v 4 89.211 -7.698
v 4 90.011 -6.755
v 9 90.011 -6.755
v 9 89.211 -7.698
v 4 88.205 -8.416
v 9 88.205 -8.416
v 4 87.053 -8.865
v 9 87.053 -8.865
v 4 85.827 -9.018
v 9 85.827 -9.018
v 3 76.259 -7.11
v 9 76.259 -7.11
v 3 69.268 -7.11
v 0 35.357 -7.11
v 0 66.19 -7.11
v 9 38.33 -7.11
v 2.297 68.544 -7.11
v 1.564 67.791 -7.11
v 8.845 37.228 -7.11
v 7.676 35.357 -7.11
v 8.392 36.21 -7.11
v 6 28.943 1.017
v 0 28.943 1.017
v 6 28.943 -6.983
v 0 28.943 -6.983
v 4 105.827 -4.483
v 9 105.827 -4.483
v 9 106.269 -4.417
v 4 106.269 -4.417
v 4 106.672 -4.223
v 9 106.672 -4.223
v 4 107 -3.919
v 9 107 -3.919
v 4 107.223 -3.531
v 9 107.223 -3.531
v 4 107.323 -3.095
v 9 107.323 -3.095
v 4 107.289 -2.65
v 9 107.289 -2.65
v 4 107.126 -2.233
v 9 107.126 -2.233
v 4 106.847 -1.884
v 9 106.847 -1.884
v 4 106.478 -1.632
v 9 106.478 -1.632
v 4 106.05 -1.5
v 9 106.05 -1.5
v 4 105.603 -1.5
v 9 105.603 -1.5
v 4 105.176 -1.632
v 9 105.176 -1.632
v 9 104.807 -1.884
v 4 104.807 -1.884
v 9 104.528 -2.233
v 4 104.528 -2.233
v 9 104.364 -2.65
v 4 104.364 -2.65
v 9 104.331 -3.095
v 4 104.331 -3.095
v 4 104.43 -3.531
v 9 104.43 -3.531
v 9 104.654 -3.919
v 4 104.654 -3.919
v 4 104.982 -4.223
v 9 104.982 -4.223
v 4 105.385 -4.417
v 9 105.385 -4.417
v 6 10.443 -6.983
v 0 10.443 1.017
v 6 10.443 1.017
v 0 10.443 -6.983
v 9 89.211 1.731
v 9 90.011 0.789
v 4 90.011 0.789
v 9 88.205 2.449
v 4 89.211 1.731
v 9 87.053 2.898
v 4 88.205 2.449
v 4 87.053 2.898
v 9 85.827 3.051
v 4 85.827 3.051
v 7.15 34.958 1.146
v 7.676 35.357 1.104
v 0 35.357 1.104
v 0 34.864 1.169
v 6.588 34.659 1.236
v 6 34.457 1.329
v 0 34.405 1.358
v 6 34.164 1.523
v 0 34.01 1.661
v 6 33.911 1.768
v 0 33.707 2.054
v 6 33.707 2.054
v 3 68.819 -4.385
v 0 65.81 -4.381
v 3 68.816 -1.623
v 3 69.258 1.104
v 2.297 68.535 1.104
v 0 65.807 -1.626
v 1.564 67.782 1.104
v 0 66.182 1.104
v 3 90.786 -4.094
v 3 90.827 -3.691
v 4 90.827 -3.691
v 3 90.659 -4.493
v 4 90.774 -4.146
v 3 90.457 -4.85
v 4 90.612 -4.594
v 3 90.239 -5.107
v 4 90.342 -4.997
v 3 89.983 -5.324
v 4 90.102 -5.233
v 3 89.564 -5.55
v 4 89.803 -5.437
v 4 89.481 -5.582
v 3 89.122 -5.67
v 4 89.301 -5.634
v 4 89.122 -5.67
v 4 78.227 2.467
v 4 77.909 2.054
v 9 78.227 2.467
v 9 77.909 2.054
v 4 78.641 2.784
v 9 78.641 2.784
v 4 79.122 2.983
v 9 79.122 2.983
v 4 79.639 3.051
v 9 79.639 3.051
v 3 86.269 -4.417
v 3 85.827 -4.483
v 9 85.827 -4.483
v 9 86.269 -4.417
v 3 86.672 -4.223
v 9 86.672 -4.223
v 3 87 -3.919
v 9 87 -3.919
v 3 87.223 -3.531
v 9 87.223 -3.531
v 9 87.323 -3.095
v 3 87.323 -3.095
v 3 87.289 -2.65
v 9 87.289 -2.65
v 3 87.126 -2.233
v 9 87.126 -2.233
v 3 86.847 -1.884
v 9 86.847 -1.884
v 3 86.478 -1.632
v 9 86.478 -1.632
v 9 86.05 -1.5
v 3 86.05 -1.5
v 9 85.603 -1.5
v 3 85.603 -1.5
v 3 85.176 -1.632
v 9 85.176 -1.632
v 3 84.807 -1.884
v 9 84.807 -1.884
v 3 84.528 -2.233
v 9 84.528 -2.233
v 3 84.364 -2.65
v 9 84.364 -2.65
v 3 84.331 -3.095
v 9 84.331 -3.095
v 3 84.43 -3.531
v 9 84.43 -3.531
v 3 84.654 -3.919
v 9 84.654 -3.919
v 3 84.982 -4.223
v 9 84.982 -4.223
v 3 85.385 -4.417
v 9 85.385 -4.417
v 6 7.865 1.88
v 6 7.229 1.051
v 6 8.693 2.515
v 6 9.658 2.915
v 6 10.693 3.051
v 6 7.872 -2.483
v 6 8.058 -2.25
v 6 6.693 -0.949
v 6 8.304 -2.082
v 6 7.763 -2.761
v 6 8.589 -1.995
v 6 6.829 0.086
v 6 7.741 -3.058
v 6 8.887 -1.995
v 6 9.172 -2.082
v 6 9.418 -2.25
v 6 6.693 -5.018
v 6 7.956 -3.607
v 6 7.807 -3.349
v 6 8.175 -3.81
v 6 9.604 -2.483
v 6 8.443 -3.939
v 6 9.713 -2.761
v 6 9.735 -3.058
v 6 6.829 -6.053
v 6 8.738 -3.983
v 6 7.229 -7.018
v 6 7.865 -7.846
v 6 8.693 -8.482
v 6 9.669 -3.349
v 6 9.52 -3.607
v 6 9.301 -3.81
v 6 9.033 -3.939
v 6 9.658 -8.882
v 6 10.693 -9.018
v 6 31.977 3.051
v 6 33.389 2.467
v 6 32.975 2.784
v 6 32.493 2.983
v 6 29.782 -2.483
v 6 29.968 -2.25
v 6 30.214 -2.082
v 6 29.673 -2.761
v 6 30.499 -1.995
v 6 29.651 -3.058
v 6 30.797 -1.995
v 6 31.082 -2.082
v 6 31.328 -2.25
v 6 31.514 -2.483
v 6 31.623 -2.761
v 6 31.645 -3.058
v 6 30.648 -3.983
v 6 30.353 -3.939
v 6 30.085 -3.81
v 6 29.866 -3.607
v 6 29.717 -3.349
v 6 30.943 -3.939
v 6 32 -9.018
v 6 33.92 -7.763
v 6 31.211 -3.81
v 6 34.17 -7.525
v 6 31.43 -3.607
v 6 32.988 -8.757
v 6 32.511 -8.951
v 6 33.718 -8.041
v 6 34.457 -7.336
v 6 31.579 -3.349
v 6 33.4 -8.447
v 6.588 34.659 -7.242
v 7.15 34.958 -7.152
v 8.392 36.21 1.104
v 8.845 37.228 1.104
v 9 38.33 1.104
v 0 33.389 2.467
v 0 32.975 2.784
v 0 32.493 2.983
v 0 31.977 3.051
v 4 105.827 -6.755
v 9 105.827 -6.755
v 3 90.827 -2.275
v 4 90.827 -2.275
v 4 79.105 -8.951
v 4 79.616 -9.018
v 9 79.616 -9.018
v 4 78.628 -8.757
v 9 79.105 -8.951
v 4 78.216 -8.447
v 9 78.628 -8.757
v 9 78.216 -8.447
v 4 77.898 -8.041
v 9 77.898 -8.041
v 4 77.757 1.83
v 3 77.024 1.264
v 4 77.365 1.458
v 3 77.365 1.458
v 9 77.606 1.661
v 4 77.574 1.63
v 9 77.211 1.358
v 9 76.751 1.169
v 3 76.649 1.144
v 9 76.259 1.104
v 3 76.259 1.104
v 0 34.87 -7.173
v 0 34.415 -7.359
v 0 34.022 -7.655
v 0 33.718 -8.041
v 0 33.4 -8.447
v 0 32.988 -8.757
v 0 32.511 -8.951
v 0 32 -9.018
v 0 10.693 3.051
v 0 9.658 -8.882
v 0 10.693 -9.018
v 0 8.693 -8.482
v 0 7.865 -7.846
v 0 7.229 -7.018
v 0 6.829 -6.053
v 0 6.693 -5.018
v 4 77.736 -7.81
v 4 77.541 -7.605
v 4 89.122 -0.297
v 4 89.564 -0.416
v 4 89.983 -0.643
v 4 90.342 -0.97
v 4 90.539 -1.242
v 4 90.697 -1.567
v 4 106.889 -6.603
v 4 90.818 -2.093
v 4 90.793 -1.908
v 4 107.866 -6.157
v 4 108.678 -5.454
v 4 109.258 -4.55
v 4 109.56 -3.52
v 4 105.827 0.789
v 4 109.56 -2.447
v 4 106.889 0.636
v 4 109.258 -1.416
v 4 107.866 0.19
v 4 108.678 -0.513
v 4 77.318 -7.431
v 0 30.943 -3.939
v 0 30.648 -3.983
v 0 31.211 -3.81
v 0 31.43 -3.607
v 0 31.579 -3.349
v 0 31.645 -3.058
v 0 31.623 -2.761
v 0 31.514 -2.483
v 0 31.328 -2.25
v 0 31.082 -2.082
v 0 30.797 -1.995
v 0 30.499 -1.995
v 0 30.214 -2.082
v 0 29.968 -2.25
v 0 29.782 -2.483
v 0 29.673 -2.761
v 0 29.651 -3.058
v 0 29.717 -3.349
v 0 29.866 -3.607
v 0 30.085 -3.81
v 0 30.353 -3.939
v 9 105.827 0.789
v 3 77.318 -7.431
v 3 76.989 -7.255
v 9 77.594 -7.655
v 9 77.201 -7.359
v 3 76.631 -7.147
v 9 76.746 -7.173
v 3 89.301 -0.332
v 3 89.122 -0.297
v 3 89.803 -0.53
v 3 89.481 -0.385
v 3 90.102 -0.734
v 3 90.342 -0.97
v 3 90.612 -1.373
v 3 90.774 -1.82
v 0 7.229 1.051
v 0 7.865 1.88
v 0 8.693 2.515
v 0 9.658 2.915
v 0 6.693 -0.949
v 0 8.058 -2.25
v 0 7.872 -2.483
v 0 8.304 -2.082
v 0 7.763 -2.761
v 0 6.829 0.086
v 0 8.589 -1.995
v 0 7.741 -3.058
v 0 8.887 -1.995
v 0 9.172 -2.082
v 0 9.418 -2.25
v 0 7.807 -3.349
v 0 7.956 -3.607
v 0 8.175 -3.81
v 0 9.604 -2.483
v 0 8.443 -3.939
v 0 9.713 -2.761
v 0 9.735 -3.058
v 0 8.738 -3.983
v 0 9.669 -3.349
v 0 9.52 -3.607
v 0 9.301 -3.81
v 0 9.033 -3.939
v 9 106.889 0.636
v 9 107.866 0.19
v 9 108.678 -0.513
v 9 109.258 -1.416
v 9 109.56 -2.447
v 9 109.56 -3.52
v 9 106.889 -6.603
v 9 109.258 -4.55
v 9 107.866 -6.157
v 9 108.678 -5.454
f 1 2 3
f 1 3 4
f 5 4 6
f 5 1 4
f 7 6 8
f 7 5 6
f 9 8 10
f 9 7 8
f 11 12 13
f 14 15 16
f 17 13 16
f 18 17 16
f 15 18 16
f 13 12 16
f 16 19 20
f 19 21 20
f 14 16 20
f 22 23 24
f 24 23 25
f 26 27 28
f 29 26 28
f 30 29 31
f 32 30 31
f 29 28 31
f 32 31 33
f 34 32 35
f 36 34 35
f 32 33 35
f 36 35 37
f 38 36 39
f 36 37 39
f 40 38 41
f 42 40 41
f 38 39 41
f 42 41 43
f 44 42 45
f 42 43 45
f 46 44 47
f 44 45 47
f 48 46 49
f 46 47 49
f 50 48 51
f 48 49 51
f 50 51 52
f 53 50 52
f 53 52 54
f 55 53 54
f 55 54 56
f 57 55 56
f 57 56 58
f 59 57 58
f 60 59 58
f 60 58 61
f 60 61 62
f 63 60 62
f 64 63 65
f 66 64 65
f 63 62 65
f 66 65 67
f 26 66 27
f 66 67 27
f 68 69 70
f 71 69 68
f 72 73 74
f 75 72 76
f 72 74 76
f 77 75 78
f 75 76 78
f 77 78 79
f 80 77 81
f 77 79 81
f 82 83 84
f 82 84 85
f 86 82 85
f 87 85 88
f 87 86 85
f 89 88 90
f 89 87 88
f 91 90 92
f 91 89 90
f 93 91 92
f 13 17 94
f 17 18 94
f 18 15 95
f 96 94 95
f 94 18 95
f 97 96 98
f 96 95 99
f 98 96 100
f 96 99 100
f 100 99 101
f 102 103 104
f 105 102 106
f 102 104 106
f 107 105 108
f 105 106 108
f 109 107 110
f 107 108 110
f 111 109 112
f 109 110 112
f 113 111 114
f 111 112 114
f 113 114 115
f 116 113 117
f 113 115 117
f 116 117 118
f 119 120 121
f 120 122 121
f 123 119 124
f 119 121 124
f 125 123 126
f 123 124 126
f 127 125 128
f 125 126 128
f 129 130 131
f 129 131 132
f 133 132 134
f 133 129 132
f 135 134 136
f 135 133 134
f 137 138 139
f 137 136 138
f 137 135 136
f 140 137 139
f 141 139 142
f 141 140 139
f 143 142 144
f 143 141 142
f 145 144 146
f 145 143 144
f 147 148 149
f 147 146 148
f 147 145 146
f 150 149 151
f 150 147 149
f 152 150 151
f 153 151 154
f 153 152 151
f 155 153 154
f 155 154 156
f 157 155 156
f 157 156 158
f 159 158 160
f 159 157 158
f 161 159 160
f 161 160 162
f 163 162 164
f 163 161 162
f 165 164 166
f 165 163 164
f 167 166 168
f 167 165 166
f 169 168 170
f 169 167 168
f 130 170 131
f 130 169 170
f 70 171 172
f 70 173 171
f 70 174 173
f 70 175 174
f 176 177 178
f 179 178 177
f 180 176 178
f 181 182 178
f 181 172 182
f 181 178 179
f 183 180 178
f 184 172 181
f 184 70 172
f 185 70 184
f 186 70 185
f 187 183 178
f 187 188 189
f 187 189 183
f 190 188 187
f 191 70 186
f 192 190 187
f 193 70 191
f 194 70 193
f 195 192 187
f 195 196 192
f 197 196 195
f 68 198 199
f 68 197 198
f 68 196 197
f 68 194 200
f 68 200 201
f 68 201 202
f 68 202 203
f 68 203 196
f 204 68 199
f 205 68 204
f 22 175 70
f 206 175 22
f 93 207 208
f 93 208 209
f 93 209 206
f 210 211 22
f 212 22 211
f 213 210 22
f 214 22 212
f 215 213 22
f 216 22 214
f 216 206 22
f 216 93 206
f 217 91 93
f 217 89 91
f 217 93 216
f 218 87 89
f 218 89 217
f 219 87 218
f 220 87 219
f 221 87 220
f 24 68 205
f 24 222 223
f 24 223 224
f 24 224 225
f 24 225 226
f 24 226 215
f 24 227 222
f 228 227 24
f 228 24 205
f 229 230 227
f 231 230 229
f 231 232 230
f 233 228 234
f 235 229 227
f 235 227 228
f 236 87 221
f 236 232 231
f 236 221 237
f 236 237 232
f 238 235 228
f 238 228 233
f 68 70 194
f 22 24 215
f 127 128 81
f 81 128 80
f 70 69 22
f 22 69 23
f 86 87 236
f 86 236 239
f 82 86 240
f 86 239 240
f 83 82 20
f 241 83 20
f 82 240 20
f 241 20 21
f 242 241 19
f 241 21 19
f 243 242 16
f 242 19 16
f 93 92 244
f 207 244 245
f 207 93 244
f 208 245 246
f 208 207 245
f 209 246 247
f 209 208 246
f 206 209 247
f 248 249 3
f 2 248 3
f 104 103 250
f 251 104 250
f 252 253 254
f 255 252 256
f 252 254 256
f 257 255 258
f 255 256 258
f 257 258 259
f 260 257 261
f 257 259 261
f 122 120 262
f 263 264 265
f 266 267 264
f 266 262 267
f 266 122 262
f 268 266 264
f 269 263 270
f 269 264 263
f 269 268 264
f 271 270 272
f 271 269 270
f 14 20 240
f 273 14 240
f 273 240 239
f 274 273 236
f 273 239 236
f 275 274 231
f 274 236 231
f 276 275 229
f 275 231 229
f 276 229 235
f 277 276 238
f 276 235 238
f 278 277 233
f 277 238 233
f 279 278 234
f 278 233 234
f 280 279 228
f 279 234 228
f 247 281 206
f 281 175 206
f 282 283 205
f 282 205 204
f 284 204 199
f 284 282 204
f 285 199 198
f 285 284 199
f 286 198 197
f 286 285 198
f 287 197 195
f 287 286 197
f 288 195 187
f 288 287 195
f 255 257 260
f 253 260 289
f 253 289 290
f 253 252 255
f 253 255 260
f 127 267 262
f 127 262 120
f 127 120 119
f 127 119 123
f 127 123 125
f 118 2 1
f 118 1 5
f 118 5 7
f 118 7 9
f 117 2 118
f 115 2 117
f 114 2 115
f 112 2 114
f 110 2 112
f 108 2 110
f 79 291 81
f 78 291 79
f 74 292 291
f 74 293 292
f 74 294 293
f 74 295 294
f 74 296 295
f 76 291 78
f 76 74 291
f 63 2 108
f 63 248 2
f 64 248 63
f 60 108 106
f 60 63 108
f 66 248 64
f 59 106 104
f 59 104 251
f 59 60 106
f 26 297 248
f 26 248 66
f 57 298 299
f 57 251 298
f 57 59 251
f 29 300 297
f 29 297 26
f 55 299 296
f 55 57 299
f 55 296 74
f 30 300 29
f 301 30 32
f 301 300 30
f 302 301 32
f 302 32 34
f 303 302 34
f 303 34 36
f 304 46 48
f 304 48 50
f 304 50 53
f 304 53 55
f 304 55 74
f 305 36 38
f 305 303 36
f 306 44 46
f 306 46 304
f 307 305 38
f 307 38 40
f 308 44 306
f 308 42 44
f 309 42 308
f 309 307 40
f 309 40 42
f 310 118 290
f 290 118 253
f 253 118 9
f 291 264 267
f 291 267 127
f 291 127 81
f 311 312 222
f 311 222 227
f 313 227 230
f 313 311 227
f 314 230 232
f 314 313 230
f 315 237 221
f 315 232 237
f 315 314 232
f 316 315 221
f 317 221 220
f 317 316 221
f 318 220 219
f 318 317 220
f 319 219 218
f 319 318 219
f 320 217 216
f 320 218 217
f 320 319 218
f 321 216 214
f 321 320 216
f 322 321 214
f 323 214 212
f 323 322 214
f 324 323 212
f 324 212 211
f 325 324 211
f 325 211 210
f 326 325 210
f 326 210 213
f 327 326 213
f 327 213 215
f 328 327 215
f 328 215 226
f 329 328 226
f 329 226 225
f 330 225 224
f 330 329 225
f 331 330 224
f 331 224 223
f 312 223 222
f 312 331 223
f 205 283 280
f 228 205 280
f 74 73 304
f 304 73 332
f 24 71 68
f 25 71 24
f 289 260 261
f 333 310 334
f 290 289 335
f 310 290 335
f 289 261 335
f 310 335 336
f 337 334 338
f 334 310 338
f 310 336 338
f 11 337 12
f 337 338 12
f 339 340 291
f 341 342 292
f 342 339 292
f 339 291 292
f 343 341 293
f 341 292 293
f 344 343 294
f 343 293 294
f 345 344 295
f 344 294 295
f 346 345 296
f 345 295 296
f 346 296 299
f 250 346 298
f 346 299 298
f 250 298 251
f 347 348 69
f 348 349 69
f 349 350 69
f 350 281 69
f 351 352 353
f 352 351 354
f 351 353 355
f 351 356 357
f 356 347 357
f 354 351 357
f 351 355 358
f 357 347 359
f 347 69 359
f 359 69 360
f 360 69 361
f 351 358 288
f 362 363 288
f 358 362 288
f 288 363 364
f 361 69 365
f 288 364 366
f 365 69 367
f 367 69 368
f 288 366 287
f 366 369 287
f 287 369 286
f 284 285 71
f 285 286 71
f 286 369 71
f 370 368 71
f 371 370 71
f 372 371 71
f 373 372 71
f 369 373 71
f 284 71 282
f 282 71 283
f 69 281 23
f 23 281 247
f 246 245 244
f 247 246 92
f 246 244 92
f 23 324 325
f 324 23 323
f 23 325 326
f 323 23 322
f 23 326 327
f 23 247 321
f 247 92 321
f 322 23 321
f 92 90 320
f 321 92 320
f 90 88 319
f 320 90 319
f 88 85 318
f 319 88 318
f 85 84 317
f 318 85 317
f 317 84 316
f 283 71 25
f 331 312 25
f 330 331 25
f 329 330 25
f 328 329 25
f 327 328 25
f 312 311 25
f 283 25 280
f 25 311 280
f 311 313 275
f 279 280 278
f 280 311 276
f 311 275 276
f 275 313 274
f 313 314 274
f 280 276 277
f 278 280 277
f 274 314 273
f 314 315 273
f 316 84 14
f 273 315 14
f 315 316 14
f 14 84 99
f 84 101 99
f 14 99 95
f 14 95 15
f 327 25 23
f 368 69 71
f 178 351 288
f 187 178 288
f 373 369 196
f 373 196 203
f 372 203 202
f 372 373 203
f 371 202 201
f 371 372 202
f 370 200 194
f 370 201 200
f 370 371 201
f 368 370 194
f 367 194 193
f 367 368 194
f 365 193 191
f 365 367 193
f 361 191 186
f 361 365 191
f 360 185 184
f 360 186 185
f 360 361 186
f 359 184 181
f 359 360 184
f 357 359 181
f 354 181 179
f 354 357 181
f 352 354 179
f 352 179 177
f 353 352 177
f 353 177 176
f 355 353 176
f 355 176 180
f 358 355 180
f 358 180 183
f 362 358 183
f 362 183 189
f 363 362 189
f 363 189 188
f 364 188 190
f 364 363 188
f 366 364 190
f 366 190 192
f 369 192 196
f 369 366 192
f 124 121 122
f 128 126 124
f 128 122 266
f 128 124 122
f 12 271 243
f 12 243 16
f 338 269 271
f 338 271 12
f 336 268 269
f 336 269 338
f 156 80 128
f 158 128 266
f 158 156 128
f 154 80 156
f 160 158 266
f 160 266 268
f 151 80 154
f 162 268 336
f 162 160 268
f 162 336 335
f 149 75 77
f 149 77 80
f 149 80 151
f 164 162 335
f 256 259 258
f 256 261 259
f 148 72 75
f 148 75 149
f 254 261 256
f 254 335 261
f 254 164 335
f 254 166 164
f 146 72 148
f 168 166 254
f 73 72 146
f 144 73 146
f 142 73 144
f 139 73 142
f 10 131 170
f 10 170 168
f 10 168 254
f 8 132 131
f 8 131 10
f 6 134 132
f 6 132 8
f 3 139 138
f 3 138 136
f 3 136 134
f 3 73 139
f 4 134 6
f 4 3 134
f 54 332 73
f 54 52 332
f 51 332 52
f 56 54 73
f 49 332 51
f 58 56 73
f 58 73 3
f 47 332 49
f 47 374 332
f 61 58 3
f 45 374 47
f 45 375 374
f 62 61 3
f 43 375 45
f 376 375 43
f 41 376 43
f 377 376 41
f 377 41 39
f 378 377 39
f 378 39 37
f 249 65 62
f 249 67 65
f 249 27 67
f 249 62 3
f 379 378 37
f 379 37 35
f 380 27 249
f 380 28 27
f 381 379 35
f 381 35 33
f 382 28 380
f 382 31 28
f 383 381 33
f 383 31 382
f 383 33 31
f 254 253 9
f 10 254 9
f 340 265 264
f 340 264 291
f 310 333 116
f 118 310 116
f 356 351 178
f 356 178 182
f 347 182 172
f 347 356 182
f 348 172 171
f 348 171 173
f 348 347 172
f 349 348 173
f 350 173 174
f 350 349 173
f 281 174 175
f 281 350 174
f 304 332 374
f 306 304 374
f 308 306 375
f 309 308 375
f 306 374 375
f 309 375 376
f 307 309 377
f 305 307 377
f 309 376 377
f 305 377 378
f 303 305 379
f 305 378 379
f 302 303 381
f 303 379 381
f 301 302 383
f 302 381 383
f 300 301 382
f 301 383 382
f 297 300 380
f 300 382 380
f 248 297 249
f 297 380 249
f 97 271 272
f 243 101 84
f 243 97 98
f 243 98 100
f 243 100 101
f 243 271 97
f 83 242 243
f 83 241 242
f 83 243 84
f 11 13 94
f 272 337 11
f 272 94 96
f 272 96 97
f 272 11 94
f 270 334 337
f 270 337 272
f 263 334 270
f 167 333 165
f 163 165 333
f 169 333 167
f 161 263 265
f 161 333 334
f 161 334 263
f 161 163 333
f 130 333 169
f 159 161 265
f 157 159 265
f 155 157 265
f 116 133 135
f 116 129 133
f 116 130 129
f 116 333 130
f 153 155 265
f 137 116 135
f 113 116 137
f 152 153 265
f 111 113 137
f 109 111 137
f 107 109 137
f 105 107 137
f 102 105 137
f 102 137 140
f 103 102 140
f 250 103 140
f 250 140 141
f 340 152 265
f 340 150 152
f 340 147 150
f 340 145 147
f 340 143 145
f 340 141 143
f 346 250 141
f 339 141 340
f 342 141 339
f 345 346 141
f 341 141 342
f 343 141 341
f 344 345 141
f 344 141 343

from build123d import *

# Parameters (mm, degrees)
SKETCH1_R               = 10
SKETCH1_R_2             = 0.8
SKETCH1_R_3             = 3.301767793
BOSS_EXTRUDE1_DEPTH     = 1.5
SKETCH2_R               = 10
BOSS_EXTRUDE2_DEPTH     = 9
CUT_EXTRUDE1_DEPTH      = 93.583714931
CUT_EXTRUDE1_DEPTH_BACK = 93.583714931
SKETCH3_R               = 1.5
FILLET1_R               = 5
SKETCH4_R               = 1.5
BOSS_EXTRUDE3_DEPTH     = 5
CUT_EXTRUDE2_DEPTH      = 4
FILLET3_R               = 2
SKETCH6_W               = 12.069016708
SKETCH6_H               = 36.150412664
BOSS_EXTRUDE4_DEPTH     = 9
CUT_EXTRUDE3_DEPTH      = 112.059195252
CUT_EXTRUDE3_DEPTH_BACK = 112.059195252
CUT_EXTRUDE4_DEPTH      = 111.336877259
CUT_EXTRUDE4_DEPTH_BACK = 111.336877259
SKETCH8_R               = 1
SKETCH8_W               = 8
SKETCH8_H               = 18.5
FILLET4_R               = 4
SKETCH9_W               = 24.382356312
SKETCH9_H               = 35.371587325
CUT_EXTRUDE5_DEPTH      = 3
FILLET5_R               = 4
SKETCH10_R              = 20.065343601
CUT_EXTRUDE6_DEPTH      = 3
CUT_EXTRUDE7_DEPTH      = 111.33687725
CUT_EXTRUDE7_DEPTH_BACK = 111.33687725
FILLET6_R               = 2
CHAMFER1_SIZE           = 3


# Some blends are built 0.0001 mm under size
with BuildPart() as part:
    # Sketch1 → Boss-Extrude1 (new body)
    with BuildSketch(Plane(origin=(0, 0, 0), x_dir=(0, 0, -1), z_dir=(1, 0, 0))):
        with Locations((2.983378847, 10.826778074)):
            Circle(SKETCH1_R)
        with Locations((2.983378847, 18.576778074)):
            Circle(SKETCH1_R_2, mode=Mode.SUBTRACT)
        with Locations((2.983378847, 3.076778074)):
            Circle(SKETCH1_R_2, mode=Mode.SUBTRACT)
        with Locations((-3.266621153, 10.826778074)):
            Circle(SKETCH1_R_2, mode=Mode.SUBTRACT)
        with Locations((9.233378847, 10.826778074)):
            Circle(SKETCH1_R_2, mode=Mode.SUBTRACT)
        with Locations((2.983378847, 10.826778074)):
            Circle(SKETCH1_R_3, mode=Mode.SUBTRACT)
    extrude(amount=BOSS_EXTRUDE1_DEPTH)

    # Sketch2 → Boss-Extrude2 (add)
    with BuildSketch(Plane.ZY):
        with BuildLine():
            Line((-15.531923741, 90.826778074), (9.565166047, 90.826778074))
            Line((9.565166047, 90.826778074), (9.565166047, 10.826778074))
            ThreePointArc((9.565166047, 10.826778074), (-2.983378847, -1.721766821), (-15.531923741, 10.826778074))
            Line((-15.531923741, 10.826778074), (-15.531923741, 90.826778074))
        make_face()
        with Locations((-2.983378847, 10.826778074)):
            Circle(SKETCH2_R, mode=Mode.SUBTRACT)
    extrude(amount=-BOSS_EXTRUDE2_DEPTH)

    # Sketch3 → Cut-Extrude1 (cut, two sides: drawn at the far end of the back side and taken through both)
    with BuildSketch(Plane(origin=(9, 0, 0), x_dir=(0, 0, -1), z_dir=(1, 0, 0)).offset(-CUT_EXTRUDE1_DEPTH_BACK)):
        with Locations((2.983378847, 85.826778074)):
            Circle(SKETCH3_R)
        with BuildLine():
            Line((-3.051129507, 36.150412664), (-3.051129507, 97.572569437))
            Line((-3.051129507, 97.572569437), (-16.389018159, 97.572569437))
            Line((-16.389018159, 97.572569437), (-16.389018159, 8.14109285))
            Line((-16.389018159, 8.14109285), (-9.565166047, 10.826778074))
            add(Edge.make_bspline(
                [(-9.565166047, 10.826778074), (-9.644230884, 15.122204253), (-6.916245701, 23.507010268), (-3.42826878, 31.561714956), (-3.051129507, 36.150412664)],
                knots=[0, 0, 0, 0, 0.482384809, 1, 1, 1, 1], degree=3))
        make_face()
        with BuildLine():
            Line((22.355775853, 8.14109285), (15.531923741, 10.826778074))
            add(Edge.make_bspline(
                [(15.531923741, 10.826778074), (15.610988578, 15.122204253), (12.883003395, 23.507010268), (9.395026474, 31.561714956), (9.017887201, 36.150412664)],
                knots=[0, 0, 0, 0, 0.482384809, 1, 1, 1, 1], degree=3))
            Line((9.017887201, 36.150412664), (9.017887201, 97.572569437))
            Line((9.017887201, 97.572569437), (22.355775853, 97.572569437))
            Line((22.355775853, 97.572569437), (22.355775853, 8.14109285))
        make_face()
    extrude(amount=CUT_EXTRUDE1_DEPTH + CUT_EXTRUDE1_DEPTH_BACK, mode=Mode.SUBTRACT)

    # Fillet1
    fillet1_edges = [part.edges().sort_by_distance(p)[0] for p in [
        (4.5, 90.826778074, 3.051129507),
        (4.5, 90.826778074, -9.017887201),
    ]]
    fillet(fillet1_edges, radius=FILLET1_R)

    # Sketch4 → Boss-Extrude3 (add)
    with BuildSketch(Plane(origin=(9, 0, 0), x_dir=(0, 0, -1), z_dir=(1, 0, 0))):
        with BuildLine():
            Line((-0.788675957, 85.826778074), (-0.788675957, 105.826778074))
            ThreePointArc((-0.788675957, 105.826778074), (2.983378847, 109.598832877), (6.755433651, 105.826778074))
            Line((6.755433651, 105.826778074), (6.755433651, 85.826778074))
            ThreePointArc((6.755433651, 85.826778074), (2.983378847, 82.05472327), (-0.788675957, 85.826778074))
        make_face()
        with Locations((2.983378847, 105.826778074)):
            Circle(SKETCH4_R, mode=Mode.SUBTRACT)
        with Locations((2.983378847, 85.826778074)):
            Circle(SKETCH4_R, mode=Mode.SUBTRACT)
    extrude(amount=-BOSS_EXTRUDE3_DEPTH)

    # Sketch5 → Cut-Extrude2 (cut)
    with BuildSketch(Plane.ZY):
        Polygon((3.051129507, 66.690354093), (-0.520583075, 90.618436978), (8.994411849, 90.618436978), (4.452818785, 66.690354093), align=None)
        Polygon((-9.017887201, 66.690354093), (-5.446174619, 90.618436978), (-12.469802715, 95.280611626), (-31.447569196, 66.690354093), align=None)
    extrude(amount=-CUT_EXTRUDE2_DEPTH, mode=Mode.SUBTRACT)

    # Fillet3
    fillet3_edges = [part.edges().sort_by_distance(p)[0] for p in [
        (2, 90.618436978, -5.446174619),
        (2, 90.618436978, -0.520583075),
    ]]
    fillet(fillet3_edges, radius=FILLET3_R)

    # Sketch6 → Boss-Extrude4 (add)
    with BuildSketch(Plane(origin=(9, 0, 0), x_dir=(0, 0, -1), z_dir=(1, 0, 0))):
        with Locations((2.983378847, 18.075206332)):
            Rectangle(SKETCH6_W, SKETCH6_H)
    extrude(amount=-BOSS_EXTRUDE4_DEPTH)

    # Sketch7 → Cut-Extrude3 (cut, two sides: drawn at the far end of the back side and taken through both)
    with BuildSketch(Plane(origin=(9, 0, 0), x_dir=(0, 0, -1), z_dir=(1, 0, 0)).offset(-CUT_EXTRUDE3_DEPTH_BACK)):
        Polygon((-3.051129507, -1.9847985), (-23.499593466, -1.9847985), (-3.051129507, 36.150412664), (-3.051129507, 6.693164213), (9.017887201, 6.693164213), (9.017887201, 36.150412664), (33.091996179, 2.744303699), (9.017887201, -7.659721138), align=None)
    extrude(amount=CUT_EXTRUDE3_DEPTH + CUT_EXTRUDE3_DEPTH_BACK, mode=Mode.SUBTRACT)

    # Sketch8 → Cut-Extrude4 (cut, two sides: drawn at the far end of the back side and taken through both)
    with BuildSketch(Plane(origin=(9, 0, 0), x_dir=(0, 0, -1), z_dir=(1, 0, 0)).offset(-CUT_EXTRUDE4_DEPTH_BACK)):
        with Locations((2.983378847, 30.648164213)):
            Circle(SKETCH8_R)
        with Locations((2.983378847, 8.738164213)):
            Circle(SKETCH8_R)
        with Locations((2.983378847, 19.693164213)):
            Rectangle(SKETCH8_W, SKETCH8_H)
    extrude(amount=CUT_EXTRUDE4_DEPTH + CUT_EXTRUDE4_DEPTH_BACK, mode=Mode.SUBTRACT)

    # Fillet4
    fillet4_edges = [part.edges().sort_by_distance(p)[0] for p in [
        (4.5, 6.693164213, -9.017887201),
        (4.5, 6.693164213, 3.051129507),
    ]]
    fillet(fillet4_edges, radius=FILLET4_R)

    # Sketch9 → Cut-Extrude5 (cut)
    with BuildSketch(Plane(origin=(9, 0, 0), x_dir=(0, 0, -1), z_dir=(1, 0, 0))):
        with Locations((3.21232116, 16.771571926)):
            Rectangle(SKETCH9_W, SKETCH9_H)
    extrude(amount=-CUT_EXTRUDE5_DEPTH, mode=Mode.SUBTRACT)

    # Fillet5
    # the kernel refuses this fillet: 4 mm, written as the material it takes off along each edge
    with BuildSketch(Plane(origin=(9, 34.457365588, -18.700345567), x_dir=(0, 1, 0), z_dir=(0, 0, 1))) as fillet5_piece_1:
        with BuildLine():
            CenterArc((3.872983346, 4), FILLET5_R, 194.477512186, 75.522487814)
            Line((0, 3), (-0.077459667, 2.98))
            ThreePointArc((-0.077459667, 2.98), (-0.08, 1.5), (-0.08, 0))
            Line((-0.08, 0), (0, -0.08))
            Line((0, -0.08), (3.872983346, -0.08))
            Line((3.872983346, -0.08), (3.872983346, 0))
        make_face()
    extrude(amount=31.43393344, mode=Mode.SUBTRACT)

    # Sketch10 → Cut-Extrude6 (cut)
    with BuildSketch(Plane.ZY):
        with Locations((-2.983378847, 85.826778074)):
            Circle(SKETCH10_R)
    extrude(amount=-CUT_EXTRUDE6_DEPTH, mode=Mode.SUBTRACT)

    # Sketch11 → Cut-Extrude7 (cut, two sides: drawn at the far end of the back side and taken through both)
    with BuildSketch(Plane.ZY.offset(-CUT_EXTRUDE7_DEPTH_BACK)):
        with BuildLine():
            Line((-7.109989343, 76.258566083), (-7.109989343, 35.357320381))
            ThreePointArc((-7.109989343, 35.357320381), (-9.017887201, 33.449422522), (-10.925785059, 35.357320381))
            Line((-10.925785059, 35.357320381), (-10.925785059, 76.258566083))
            ThreePointArc((-10.925785059, 76.258566083), (-9.017887201, 78.166463942), (-7.109989343, 76.258566083))
        make_face()
        with BuildLine():
            Line((1.103749815, 76.258566083), (1.103749815, 35.357320381))
            ThreePointArc((1.103749815, 35.357320381), (3.011647673, 33.449422522), (4.919545531, 35.357320381))
            Line((4.919545531, 35.357320381), (4.919545531, 76.258566083))
            ThreePointArc((4.919545531, 76.258566083), (3.011647673, 78.166463942), (1.103749815, 76.258566083))
        make_face()
    extrude(amount=CUT_EXTRUDE7_DEPTH + CUT_EXTRUDE7_DEPTH_BACK, mode=Mode.SUBTRACT)

    # Fillet6
    fillet6_edges = [part.edges().sort_by_distance(p)[0] for p in [
        (3, 33.449422522, -9.017887201),
        (6.5, 78.166463942, -9.017887201),
        (3, 33.449831083, 3.051129507),
        (6.5, 78.166055381, 3.051129507),
    ]]
    fillet(fillet6_edges, radius=FILLET6_R)

    # Chamfer1
    chamfer1_edges = [part.edges().sort_by_distance(p)[0] for p in [
        (3, 65.761444608, -3.003546718),
    ]]
    chamfer(chamfer1_edges, length=CHAMFER1_SIZE - 0.0001)  # a hair under: the kernel refuses the full size


solid = part.part
